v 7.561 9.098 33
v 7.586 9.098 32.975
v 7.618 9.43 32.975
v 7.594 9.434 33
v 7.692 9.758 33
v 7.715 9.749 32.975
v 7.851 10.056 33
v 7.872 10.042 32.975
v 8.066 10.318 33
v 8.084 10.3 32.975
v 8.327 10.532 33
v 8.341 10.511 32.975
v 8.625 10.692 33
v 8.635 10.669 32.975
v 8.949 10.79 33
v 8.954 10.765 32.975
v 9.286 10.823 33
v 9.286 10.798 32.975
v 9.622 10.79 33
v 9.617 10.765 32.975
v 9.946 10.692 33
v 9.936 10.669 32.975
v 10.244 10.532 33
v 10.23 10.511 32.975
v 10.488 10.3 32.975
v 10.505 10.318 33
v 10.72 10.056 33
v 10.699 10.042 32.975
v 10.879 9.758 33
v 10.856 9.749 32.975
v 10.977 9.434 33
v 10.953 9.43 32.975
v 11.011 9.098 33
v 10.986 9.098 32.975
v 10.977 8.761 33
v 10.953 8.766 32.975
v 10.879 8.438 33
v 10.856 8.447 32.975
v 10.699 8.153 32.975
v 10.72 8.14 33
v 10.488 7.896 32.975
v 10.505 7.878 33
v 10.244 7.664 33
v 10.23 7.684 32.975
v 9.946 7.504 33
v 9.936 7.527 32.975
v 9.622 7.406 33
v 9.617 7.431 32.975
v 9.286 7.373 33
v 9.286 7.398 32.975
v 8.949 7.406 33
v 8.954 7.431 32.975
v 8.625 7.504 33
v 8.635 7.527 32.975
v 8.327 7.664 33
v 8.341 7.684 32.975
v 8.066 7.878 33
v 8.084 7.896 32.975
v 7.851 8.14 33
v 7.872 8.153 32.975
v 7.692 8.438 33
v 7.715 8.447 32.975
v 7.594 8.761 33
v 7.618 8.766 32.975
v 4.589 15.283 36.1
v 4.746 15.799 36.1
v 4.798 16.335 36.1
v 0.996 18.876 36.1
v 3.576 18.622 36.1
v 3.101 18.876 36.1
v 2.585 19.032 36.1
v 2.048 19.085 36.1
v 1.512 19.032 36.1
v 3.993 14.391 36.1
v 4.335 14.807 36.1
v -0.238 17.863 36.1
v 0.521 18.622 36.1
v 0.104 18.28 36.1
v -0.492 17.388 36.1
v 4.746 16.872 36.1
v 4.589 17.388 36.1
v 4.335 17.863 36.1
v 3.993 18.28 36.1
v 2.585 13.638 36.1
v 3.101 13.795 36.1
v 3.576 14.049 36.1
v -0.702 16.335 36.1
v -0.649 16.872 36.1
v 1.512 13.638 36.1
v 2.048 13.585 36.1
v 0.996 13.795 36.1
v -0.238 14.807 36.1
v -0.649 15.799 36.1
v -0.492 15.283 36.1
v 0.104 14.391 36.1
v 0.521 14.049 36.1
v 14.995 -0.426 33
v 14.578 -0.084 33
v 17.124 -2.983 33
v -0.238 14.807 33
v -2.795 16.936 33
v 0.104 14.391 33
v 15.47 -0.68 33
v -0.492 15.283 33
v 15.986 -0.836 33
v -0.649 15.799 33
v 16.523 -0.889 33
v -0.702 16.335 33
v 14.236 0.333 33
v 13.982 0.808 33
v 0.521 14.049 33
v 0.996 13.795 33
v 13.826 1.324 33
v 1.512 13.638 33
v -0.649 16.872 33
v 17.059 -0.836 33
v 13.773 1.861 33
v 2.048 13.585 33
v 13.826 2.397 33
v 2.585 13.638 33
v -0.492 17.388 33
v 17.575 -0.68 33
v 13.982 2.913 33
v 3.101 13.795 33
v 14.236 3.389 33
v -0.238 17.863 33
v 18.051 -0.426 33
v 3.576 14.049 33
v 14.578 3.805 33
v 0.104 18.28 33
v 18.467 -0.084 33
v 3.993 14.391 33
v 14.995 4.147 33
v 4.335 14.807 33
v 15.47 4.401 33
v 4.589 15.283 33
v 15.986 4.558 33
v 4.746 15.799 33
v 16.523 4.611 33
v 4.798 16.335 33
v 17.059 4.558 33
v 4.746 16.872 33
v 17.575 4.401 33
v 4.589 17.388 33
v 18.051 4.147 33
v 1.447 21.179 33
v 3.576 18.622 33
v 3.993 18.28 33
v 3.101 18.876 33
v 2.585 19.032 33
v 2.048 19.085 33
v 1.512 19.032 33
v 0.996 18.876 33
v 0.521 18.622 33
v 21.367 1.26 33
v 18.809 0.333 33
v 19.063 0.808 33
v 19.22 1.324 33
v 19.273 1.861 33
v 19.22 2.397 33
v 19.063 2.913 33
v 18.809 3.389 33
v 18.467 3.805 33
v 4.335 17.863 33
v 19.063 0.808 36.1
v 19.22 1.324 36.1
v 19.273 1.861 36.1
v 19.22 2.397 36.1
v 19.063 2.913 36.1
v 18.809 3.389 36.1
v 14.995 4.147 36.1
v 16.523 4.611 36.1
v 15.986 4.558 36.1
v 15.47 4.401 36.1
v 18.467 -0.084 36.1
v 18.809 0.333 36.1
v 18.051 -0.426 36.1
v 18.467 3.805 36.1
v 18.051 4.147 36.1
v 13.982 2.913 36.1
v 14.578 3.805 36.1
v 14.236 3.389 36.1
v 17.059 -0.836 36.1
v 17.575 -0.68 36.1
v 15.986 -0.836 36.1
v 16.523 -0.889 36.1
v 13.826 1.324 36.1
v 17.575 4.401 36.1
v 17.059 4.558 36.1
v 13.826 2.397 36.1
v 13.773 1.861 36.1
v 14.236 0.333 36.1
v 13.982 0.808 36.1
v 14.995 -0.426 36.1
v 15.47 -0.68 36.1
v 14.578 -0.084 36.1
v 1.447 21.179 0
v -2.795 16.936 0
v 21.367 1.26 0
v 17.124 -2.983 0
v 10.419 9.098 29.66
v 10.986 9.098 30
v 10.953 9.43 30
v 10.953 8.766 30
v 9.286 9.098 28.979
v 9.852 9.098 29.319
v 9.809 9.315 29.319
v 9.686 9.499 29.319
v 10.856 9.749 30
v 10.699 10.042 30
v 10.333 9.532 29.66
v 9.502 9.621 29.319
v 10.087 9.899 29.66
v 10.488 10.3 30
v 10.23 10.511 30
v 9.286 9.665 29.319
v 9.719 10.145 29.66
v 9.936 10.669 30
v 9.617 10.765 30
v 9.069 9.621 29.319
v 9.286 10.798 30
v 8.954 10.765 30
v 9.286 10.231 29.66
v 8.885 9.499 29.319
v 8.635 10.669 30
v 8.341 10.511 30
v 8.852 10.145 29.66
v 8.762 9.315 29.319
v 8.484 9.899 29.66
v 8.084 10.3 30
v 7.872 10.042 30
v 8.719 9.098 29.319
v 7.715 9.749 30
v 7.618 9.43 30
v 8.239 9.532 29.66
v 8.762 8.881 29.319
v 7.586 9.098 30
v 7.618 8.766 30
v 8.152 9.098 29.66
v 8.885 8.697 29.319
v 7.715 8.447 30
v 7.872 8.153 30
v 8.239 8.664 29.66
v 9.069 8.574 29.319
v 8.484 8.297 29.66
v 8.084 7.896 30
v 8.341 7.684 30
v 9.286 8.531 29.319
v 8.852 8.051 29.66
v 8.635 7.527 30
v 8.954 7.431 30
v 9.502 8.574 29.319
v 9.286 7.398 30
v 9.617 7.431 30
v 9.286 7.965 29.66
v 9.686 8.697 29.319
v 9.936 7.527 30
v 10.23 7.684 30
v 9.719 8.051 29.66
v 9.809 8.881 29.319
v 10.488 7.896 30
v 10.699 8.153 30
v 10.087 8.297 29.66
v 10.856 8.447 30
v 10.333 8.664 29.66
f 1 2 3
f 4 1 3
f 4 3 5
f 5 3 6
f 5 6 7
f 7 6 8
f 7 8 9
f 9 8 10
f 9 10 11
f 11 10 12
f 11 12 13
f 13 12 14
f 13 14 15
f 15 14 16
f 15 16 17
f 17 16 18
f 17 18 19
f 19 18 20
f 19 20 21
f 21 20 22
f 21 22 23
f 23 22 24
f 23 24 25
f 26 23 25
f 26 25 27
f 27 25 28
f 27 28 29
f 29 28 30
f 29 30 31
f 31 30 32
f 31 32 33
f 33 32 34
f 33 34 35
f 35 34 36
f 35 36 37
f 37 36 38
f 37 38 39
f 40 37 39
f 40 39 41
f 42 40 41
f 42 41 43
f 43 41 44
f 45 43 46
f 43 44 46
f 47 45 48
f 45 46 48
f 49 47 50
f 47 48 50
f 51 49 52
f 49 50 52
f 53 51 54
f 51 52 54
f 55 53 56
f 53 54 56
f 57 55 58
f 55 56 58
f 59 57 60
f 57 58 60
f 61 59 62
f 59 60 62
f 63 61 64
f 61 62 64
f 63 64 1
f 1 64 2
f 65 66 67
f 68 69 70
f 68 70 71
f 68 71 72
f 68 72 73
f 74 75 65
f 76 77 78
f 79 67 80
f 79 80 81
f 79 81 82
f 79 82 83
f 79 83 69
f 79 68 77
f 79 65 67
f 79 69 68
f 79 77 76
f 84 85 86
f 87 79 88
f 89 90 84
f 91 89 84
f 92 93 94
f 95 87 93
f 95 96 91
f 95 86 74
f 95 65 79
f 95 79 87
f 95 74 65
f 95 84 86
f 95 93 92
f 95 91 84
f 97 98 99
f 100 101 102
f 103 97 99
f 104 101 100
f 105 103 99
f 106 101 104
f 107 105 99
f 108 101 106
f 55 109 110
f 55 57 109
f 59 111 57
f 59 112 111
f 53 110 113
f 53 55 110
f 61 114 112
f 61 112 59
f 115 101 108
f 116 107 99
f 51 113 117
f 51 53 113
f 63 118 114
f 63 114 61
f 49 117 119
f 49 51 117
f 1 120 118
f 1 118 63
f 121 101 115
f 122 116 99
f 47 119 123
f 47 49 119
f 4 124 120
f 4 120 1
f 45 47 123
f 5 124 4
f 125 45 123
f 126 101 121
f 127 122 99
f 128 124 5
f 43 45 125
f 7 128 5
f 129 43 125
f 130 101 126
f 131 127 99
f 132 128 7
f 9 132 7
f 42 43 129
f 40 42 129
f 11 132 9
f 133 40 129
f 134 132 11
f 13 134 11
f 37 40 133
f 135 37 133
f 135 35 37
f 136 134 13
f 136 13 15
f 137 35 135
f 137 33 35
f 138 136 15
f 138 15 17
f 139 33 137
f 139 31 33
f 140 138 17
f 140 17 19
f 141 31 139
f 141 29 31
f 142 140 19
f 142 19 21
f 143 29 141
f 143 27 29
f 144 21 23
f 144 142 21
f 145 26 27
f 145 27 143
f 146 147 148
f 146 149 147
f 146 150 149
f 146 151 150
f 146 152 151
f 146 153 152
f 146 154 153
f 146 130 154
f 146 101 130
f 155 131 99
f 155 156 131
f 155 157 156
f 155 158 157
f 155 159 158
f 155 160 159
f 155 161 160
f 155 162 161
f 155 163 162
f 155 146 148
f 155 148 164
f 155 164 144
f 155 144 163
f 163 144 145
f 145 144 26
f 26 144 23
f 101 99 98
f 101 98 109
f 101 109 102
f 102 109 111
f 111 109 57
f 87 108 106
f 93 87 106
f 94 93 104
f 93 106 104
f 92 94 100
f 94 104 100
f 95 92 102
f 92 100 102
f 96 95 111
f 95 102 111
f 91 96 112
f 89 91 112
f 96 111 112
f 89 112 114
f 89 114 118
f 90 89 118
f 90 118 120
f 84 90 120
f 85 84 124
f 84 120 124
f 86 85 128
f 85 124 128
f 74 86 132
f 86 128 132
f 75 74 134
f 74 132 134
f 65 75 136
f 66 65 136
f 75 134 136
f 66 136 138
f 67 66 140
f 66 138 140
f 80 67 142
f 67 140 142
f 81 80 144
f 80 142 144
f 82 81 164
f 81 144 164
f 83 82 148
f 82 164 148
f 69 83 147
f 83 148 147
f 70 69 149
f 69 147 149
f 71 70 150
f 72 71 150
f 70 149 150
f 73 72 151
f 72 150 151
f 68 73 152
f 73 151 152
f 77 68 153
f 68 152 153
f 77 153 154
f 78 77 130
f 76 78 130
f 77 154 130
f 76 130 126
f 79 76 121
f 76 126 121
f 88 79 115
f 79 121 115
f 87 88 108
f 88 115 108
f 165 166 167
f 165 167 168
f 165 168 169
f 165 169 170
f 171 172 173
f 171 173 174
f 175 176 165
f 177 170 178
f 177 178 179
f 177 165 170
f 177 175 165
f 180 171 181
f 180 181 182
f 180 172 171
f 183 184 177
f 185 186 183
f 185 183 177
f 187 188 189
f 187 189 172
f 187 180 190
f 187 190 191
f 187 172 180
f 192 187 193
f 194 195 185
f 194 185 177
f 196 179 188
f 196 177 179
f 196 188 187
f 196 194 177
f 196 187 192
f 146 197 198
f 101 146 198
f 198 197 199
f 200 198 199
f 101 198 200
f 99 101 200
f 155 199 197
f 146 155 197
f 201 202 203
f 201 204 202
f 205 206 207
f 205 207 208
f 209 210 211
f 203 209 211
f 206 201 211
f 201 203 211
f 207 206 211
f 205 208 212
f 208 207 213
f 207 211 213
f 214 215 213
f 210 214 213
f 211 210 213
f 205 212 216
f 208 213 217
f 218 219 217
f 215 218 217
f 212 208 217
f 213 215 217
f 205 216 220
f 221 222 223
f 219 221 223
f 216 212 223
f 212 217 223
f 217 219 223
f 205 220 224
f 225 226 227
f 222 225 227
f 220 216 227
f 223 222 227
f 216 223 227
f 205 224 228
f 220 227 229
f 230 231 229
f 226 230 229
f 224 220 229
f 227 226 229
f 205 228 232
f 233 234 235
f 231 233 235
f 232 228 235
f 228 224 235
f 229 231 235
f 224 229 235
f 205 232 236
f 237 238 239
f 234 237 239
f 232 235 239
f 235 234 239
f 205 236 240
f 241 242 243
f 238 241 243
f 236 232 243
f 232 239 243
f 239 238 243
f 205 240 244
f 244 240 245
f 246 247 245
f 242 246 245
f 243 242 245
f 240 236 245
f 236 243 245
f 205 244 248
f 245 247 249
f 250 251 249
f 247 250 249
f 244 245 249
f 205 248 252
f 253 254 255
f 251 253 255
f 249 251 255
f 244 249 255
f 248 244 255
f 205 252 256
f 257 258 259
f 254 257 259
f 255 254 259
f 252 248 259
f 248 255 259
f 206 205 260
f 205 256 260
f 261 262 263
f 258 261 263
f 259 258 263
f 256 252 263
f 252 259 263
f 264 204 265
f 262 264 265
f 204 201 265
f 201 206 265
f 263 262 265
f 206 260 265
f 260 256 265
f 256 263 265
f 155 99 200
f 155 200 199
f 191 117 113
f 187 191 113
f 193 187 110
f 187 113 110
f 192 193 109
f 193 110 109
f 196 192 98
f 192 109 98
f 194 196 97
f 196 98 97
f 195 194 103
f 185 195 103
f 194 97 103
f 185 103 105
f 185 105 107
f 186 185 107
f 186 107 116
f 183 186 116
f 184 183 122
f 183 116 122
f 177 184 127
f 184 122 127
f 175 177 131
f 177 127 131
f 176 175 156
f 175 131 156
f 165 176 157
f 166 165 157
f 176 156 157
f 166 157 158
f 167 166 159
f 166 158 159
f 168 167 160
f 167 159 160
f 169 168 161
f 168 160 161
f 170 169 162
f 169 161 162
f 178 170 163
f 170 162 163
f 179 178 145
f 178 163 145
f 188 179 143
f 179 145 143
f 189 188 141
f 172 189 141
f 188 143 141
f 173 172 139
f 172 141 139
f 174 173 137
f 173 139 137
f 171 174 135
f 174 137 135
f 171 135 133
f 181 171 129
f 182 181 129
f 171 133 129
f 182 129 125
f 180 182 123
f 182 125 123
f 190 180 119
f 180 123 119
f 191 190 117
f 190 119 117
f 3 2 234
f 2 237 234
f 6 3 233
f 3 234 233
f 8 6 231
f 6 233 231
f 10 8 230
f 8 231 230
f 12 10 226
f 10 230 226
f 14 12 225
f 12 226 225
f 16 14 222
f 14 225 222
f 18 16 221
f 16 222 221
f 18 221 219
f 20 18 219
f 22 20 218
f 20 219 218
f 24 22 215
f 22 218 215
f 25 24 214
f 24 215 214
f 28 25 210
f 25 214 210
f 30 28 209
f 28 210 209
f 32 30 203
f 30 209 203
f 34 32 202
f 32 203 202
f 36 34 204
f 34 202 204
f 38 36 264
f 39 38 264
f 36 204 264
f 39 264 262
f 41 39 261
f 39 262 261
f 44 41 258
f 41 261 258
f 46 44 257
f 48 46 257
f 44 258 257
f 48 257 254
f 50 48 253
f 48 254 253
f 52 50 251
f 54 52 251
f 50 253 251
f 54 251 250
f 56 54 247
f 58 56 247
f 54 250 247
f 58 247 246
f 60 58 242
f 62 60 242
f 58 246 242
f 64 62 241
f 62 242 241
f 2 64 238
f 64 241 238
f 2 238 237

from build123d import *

# Parameters (mm, degrees)
BOSS_EXTRUDE1_DEPTH            = 33
SKETCH2_R                      = 2.75
BOSS_EXTRUDE2_DEPTH            = 3.1
M3_CLEARANCE_HOLE1_D           = 3.4
M3_CLEARANCE_HOLE1_DEPTH       = 3
M3_CLEARANCE_HOLE1_CSINK_D     = 3.45
M3_CLEARANCE_HOLE1_CSINK_ANGLE = 90
M3_CLEARANCE_HOLE1_TIP         = 1.021463052


with BuildPart() as part:
    # Sketch1 → Boss-Extrude1 (new body)
    with BuildSketch(Plane.XY):
        Polygon((17.123869681, -2.982979073), (21.366510368, 1.259661614), (1.447312342, 21.17885964), (-2.795328345, 16.936218953), align=None)
    extrude(amount=BOSS_EXTRUDE1_DEPTH)

    # Sketch2 → Boss-Extrude2 (add)
    with BuildSketch(Plane.XY.offset(33)):
        with Locations(Location((2.048353106, 16.335178189, 0), (0, 0, 180))):
            Circle(SKETCH2_R)
        with Locations(Location((16.522828917, 1.860702378, 0), (0, 0, 180))):
            Circle(SKETCH2_R)
    extrude(amount=BOSS_EXTRUDE2_DEPTH)

    # M3 Clearance Hole1
    with Locations(Plane.XY.offset(33)):
        with Locations((9.285591012, 9.097940284)):
            CounterSinkHole(M3_CLEARANCE_HOLE1_D / 2, M3_CLEARANCE_HOLE1_CSINK_D / 2, depth=M3_CLEARANCE_HOLE1_DEPTH, counter_sink_angle=M3_CLEARANCE_HOLE1_CSINK_ANGLE)
            with Locations((0, 0, -(M3_CLEARANCE_HOLE1_DEPTH + M3_CLEARANCE_HOLE1_TIP / 2))):  # 118° drill point
                Cone(0, M3_CLEARANCE_HOLE1_D / 2, M3_CLEARANCE_HOLE1_TIP, mode=Mode.SUBTRACT)


solid = part.part
